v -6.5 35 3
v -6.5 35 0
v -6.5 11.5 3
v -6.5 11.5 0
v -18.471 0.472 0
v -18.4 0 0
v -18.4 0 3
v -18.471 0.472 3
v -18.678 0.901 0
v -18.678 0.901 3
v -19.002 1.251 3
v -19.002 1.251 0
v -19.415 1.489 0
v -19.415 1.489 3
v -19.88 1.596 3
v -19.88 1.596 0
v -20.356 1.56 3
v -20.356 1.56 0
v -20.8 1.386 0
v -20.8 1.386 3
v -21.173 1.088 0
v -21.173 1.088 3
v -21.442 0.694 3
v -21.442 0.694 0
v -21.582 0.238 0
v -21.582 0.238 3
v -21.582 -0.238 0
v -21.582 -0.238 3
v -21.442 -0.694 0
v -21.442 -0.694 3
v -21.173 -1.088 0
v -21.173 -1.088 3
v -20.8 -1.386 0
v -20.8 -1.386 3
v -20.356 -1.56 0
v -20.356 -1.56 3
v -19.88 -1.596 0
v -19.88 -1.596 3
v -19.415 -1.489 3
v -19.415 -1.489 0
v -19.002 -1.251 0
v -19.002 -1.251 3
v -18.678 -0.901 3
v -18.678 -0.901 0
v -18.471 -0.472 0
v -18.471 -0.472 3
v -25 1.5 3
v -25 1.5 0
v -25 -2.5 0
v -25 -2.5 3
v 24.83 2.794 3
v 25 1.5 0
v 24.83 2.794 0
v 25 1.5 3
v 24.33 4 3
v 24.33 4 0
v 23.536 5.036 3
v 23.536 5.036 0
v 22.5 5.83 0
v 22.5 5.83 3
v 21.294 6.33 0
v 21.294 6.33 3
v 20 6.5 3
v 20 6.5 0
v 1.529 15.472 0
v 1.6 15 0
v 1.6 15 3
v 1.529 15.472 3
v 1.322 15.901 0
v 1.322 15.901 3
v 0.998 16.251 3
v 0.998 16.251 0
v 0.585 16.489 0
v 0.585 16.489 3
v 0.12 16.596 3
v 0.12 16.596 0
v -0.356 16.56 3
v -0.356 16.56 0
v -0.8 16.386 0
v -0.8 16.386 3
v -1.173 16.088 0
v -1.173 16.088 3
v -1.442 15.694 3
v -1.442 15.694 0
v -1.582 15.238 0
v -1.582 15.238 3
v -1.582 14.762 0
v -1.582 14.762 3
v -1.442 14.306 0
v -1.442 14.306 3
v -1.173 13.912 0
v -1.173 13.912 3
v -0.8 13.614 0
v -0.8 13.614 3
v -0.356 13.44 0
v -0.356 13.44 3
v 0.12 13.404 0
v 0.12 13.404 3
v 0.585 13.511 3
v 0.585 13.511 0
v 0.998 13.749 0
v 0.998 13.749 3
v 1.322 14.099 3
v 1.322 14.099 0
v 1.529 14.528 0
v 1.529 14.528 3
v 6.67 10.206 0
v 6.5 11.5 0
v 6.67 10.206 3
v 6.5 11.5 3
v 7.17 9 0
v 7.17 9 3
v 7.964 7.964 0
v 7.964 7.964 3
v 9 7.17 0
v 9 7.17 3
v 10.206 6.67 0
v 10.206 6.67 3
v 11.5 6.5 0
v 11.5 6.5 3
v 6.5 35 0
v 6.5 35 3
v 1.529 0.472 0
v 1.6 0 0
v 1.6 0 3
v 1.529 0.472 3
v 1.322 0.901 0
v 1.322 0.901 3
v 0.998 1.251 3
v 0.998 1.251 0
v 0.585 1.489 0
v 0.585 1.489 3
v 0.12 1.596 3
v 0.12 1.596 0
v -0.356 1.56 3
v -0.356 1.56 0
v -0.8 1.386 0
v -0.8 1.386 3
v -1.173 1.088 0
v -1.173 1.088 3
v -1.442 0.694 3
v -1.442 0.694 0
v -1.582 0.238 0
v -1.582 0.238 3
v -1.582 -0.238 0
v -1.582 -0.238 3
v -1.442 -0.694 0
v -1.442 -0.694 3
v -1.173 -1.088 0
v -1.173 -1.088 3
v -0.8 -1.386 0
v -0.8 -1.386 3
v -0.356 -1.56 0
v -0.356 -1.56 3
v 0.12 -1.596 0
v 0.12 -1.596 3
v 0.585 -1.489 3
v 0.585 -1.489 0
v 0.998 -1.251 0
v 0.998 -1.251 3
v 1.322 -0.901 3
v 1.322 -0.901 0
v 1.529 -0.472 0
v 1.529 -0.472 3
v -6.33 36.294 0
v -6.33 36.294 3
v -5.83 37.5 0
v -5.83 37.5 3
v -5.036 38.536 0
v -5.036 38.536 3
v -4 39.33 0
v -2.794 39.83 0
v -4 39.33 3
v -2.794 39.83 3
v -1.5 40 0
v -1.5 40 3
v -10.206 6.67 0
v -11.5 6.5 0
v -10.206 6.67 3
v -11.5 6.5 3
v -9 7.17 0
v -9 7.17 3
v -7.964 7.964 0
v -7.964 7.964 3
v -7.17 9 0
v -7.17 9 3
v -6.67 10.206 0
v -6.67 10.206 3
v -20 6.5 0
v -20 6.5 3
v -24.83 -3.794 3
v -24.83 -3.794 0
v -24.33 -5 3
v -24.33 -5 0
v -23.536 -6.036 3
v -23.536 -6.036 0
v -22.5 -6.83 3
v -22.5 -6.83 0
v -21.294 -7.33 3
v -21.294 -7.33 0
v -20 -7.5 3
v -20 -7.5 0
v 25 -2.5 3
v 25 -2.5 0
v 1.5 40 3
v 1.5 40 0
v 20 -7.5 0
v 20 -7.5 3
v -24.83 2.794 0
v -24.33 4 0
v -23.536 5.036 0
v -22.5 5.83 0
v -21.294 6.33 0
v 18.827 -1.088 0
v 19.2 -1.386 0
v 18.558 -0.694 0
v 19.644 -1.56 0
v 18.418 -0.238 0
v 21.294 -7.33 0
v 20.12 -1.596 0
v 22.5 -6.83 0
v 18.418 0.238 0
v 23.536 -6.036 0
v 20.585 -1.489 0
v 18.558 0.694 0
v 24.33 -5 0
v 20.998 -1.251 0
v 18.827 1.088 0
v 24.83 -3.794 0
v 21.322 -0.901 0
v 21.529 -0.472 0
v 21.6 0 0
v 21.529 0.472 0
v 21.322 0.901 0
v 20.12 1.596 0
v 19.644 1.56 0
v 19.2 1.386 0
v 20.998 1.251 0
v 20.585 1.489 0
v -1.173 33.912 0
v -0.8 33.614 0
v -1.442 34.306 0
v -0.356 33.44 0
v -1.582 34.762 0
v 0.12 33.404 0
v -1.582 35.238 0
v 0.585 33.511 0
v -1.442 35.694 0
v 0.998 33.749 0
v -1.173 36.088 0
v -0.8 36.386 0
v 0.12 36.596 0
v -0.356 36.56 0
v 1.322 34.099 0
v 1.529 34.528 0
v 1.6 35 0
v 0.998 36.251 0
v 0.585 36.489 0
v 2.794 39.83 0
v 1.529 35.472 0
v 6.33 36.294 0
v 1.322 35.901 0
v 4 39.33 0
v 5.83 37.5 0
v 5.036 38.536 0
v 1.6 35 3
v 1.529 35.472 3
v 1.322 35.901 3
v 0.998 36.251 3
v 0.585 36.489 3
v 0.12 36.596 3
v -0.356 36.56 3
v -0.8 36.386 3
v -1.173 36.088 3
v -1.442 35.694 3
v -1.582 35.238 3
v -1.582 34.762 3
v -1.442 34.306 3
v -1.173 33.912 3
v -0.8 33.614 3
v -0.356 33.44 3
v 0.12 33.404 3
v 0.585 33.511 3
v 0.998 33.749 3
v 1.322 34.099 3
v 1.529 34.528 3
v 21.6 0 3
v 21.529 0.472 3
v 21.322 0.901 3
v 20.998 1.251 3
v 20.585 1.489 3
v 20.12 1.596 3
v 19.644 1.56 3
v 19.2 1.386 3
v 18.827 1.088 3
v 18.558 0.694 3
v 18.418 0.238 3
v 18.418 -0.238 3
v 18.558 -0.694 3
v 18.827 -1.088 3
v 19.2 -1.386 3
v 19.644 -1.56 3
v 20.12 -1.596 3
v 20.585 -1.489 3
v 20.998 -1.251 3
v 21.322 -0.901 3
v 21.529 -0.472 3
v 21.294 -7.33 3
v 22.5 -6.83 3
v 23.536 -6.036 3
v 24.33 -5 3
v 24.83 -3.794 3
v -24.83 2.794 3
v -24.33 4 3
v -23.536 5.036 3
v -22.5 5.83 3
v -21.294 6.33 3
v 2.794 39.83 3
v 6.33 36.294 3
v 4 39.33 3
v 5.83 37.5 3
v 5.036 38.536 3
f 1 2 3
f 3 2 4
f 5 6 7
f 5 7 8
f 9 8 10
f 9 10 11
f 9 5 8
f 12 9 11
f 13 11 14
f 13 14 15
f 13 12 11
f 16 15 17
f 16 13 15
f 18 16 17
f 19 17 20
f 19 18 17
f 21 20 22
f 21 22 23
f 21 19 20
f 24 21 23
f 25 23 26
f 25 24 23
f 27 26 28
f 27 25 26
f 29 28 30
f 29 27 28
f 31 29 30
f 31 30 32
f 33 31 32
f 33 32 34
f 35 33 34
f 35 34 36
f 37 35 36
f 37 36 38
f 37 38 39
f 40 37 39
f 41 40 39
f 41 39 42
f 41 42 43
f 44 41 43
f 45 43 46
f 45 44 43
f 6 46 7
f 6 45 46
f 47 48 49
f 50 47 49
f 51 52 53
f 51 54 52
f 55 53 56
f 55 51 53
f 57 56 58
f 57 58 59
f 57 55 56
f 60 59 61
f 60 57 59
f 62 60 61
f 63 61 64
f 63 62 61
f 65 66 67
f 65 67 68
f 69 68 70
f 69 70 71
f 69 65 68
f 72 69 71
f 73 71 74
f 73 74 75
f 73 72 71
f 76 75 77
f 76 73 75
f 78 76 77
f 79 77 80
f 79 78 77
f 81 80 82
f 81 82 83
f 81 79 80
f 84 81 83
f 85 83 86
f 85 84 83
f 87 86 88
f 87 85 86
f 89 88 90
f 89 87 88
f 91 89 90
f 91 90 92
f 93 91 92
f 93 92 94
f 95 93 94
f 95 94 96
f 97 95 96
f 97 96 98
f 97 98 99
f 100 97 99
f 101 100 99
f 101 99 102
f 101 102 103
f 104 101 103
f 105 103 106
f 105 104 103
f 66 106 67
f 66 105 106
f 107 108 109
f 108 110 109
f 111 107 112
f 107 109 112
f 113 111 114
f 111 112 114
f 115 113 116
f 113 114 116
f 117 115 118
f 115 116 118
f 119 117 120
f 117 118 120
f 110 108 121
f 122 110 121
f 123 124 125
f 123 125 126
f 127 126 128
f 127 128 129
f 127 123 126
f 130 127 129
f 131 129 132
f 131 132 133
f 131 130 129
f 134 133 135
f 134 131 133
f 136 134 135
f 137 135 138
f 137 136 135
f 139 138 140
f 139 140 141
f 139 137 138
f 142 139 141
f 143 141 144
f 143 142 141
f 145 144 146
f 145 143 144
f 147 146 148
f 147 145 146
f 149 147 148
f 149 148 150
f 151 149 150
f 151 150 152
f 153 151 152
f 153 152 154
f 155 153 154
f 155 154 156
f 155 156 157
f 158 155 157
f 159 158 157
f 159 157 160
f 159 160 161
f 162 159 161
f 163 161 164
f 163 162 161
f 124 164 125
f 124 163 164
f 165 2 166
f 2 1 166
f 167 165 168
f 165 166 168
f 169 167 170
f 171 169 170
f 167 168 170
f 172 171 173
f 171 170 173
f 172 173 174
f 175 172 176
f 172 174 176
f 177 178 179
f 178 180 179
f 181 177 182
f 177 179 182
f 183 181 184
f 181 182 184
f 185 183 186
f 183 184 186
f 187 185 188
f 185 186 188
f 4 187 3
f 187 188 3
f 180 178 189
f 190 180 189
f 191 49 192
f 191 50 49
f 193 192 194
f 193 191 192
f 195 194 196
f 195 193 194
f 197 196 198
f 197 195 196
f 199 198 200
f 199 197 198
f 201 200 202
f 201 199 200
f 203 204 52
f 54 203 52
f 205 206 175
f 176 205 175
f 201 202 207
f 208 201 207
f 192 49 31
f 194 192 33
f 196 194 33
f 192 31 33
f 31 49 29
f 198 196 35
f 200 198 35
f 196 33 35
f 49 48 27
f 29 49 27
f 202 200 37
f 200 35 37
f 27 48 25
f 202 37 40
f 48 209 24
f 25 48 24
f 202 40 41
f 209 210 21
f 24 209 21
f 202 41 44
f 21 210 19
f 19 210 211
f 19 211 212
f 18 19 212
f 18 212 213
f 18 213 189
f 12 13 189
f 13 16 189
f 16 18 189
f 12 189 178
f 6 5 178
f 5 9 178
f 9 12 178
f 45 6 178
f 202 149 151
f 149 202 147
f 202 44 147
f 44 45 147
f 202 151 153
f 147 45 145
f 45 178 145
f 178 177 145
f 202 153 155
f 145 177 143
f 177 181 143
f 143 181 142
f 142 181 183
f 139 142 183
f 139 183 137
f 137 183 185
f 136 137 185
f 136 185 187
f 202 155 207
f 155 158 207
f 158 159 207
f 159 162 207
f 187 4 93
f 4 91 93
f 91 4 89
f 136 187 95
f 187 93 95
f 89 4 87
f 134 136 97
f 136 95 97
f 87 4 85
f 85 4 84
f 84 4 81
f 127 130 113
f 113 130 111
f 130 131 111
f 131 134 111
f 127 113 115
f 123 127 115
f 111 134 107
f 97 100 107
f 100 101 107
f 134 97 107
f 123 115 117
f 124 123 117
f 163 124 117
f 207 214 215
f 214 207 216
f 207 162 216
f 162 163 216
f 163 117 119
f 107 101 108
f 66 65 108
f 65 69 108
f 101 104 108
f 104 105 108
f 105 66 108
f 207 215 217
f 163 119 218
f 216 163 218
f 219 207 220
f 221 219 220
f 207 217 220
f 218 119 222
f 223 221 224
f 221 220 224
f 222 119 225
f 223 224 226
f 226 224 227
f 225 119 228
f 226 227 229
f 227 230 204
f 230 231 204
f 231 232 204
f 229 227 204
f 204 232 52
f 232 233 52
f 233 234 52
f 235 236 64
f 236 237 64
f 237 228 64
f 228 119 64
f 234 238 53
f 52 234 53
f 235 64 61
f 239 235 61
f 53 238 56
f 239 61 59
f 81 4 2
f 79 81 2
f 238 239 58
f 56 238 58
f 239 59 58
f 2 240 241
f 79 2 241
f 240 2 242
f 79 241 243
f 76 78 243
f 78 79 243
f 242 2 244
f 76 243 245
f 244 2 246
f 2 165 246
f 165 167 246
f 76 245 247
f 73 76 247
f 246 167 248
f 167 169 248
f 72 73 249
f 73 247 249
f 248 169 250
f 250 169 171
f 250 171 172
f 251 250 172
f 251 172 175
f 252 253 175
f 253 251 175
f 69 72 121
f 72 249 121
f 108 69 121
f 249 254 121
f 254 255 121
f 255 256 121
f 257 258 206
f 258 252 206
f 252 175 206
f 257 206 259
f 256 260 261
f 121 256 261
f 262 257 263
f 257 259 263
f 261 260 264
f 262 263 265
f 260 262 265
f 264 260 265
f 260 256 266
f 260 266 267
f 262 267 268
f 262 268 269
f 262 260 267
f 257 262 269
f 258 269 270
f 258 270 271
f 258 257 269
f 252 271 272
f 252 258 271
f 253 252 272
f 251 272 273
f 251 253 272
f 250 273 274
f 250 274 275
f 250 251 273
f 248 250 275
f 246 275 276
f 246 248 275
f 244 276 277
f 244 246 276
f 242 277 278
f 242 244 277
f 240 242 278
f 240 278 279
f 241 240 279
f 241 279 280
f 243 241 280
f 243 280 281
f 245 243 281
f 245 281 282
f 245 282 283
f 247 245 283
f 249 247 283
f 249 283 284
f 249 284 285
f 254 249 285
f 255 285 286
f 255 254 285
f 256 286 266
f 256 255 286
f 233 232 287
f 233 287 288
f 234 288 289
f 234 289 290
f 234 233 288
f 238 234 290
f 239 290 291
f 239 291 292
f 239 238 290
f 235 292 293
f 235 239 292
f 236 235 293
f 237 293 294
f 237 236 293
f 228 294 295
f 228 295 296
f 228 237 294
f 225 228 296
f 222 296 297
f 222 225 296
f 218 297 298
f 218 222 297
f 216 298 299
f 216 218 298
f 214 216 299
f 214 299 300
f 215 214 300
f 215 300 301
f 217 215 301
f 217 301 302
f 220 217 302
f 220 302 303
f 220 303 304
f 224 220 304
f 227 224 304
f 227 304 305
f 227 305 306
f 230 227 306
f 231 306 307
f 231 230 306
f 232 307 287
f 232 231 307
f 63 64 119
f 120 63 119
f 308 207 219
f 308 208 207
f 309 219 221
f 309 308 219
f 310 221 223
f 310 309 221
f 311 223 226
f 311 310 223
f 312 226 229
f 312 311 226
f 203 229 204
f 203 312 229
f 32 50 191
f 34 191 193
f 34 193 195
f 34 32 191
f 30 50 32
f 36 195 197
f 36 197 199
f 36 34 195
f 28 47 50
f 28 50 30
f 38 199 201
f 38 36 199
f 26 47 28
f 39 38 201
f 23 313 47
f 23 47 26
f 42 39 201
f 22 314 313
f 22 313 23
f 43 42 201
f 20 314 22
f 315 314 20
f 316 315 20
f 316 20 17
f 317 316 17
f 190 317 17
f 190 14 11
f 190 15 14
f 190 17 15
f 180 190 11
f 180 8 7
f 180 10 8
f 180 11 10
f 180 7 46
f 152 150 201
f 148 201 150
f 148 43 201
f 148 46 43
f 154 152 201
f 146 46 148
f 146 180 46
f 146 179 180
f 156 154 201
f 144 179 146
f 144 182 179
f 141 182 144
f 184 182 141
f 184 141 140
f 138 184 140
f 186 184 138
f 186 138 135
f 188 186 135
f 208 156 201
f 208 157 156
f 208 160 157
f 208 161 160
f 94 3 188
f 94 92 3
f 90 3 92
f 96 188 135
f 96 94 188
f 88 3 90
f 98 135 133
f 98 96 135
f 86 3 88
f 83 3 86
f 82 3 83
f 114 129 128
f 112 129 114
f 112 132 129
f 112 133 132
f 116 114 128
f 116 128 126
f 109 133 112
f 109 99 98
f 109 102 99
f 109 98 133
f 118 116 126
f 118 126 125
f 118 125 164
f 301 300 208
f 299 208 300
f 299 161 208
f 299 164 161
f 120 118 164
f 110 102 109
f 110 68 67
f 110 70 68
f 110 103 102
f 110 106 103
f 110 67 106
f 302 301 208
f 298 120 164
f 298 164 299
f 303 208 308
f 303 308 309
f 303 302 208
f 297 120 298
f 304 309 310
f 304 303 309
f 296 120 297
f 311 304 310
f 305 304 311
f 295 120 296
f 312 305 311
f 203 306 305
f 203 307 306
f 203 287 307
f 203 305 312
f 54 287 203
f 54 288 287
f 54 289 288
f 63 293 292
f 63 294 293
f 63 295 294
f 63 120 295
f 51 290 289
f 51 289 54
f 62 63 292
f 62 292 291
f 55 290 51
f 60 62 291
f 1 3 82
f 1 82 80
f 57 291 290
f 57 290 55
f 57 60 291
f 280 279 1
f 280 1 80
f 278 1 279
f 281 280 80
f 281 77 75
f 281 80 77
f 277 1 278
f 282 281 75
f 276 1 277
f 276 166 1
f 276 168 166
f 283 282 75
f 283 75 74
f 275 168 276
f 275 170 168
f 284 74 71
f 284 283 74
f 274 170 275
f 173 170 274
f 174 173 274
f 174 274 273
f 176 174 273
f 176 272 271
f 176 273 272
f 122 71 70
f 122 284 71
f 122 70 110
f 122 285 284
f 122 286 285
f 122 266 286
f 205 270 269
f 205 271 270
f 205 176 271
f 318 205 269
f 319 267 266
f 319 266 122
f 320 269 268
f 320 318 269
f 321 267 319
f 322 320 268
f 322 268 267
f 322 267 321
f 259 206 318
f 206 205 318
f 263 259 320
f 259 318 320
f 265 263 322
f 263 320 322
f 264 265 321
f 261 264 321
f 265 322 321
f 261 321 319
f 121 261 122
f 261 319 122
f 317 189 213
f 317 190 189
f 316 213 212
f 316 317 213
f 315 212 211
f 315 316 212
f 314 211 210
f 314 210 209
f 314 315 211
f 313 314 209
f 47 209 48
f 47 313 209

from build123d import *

# Parameters (mm, degrees)
SKETCH_1_R      = 1.6
EXTRUDE_1_DEPTH = 3
FILLET_1_R      = 5


with BuildPart() as part:
    # 草图1 → 凸台-拉伸1 (new body)
    with BuildSketch(Plane.XY):
        Polygon((-6.5, 6.5), (-25, 6.5), (-25, -7.5), (25, -7.5), (25, 6.5), (6.5, 6.5), (6.5, 40), (-6.5, 40), align=None)
        with Locations((0, 35)):
            Circle(SKETCH_1_R, mode=Mode.SUBTRACT)
        with Locations((0, 15)):
            Circle(SKETCH_1_R, mode=Mode.SUBTRACT)
        Circle(SKETCH_1_R, mode=Mode.SUBTRACT)
        with Locations((20, 0)):
            Circle(SKETCH_1_R, mode=Mode.SUBTRACT)
        with Locations((-20, 0)):
            Circle(SKETCH_1_R, mode=Mode.SUBTRACT)
    extrude(amount=EXTRUDE_1_DEPTH)

    # 圆角1
    fillet_1_edges = [part.edges().sort_by_distance(p)[0] for p in [
        (-6.5, 40, 1.5),
        (6.5, 40, 1.5),
        (6.5, 6.5, 1.5),
        (25, 6.5, 1.5),
        (25, -7.5, 1.5),
        (-25, -7.5, 1.5),
        (-25, 6.5, 1.5),
        (-6.5, 6.5, 1.5),
    ]]
    fillet(fillet_1_edges, radius=FILLET_1_R)


solid = part.part
